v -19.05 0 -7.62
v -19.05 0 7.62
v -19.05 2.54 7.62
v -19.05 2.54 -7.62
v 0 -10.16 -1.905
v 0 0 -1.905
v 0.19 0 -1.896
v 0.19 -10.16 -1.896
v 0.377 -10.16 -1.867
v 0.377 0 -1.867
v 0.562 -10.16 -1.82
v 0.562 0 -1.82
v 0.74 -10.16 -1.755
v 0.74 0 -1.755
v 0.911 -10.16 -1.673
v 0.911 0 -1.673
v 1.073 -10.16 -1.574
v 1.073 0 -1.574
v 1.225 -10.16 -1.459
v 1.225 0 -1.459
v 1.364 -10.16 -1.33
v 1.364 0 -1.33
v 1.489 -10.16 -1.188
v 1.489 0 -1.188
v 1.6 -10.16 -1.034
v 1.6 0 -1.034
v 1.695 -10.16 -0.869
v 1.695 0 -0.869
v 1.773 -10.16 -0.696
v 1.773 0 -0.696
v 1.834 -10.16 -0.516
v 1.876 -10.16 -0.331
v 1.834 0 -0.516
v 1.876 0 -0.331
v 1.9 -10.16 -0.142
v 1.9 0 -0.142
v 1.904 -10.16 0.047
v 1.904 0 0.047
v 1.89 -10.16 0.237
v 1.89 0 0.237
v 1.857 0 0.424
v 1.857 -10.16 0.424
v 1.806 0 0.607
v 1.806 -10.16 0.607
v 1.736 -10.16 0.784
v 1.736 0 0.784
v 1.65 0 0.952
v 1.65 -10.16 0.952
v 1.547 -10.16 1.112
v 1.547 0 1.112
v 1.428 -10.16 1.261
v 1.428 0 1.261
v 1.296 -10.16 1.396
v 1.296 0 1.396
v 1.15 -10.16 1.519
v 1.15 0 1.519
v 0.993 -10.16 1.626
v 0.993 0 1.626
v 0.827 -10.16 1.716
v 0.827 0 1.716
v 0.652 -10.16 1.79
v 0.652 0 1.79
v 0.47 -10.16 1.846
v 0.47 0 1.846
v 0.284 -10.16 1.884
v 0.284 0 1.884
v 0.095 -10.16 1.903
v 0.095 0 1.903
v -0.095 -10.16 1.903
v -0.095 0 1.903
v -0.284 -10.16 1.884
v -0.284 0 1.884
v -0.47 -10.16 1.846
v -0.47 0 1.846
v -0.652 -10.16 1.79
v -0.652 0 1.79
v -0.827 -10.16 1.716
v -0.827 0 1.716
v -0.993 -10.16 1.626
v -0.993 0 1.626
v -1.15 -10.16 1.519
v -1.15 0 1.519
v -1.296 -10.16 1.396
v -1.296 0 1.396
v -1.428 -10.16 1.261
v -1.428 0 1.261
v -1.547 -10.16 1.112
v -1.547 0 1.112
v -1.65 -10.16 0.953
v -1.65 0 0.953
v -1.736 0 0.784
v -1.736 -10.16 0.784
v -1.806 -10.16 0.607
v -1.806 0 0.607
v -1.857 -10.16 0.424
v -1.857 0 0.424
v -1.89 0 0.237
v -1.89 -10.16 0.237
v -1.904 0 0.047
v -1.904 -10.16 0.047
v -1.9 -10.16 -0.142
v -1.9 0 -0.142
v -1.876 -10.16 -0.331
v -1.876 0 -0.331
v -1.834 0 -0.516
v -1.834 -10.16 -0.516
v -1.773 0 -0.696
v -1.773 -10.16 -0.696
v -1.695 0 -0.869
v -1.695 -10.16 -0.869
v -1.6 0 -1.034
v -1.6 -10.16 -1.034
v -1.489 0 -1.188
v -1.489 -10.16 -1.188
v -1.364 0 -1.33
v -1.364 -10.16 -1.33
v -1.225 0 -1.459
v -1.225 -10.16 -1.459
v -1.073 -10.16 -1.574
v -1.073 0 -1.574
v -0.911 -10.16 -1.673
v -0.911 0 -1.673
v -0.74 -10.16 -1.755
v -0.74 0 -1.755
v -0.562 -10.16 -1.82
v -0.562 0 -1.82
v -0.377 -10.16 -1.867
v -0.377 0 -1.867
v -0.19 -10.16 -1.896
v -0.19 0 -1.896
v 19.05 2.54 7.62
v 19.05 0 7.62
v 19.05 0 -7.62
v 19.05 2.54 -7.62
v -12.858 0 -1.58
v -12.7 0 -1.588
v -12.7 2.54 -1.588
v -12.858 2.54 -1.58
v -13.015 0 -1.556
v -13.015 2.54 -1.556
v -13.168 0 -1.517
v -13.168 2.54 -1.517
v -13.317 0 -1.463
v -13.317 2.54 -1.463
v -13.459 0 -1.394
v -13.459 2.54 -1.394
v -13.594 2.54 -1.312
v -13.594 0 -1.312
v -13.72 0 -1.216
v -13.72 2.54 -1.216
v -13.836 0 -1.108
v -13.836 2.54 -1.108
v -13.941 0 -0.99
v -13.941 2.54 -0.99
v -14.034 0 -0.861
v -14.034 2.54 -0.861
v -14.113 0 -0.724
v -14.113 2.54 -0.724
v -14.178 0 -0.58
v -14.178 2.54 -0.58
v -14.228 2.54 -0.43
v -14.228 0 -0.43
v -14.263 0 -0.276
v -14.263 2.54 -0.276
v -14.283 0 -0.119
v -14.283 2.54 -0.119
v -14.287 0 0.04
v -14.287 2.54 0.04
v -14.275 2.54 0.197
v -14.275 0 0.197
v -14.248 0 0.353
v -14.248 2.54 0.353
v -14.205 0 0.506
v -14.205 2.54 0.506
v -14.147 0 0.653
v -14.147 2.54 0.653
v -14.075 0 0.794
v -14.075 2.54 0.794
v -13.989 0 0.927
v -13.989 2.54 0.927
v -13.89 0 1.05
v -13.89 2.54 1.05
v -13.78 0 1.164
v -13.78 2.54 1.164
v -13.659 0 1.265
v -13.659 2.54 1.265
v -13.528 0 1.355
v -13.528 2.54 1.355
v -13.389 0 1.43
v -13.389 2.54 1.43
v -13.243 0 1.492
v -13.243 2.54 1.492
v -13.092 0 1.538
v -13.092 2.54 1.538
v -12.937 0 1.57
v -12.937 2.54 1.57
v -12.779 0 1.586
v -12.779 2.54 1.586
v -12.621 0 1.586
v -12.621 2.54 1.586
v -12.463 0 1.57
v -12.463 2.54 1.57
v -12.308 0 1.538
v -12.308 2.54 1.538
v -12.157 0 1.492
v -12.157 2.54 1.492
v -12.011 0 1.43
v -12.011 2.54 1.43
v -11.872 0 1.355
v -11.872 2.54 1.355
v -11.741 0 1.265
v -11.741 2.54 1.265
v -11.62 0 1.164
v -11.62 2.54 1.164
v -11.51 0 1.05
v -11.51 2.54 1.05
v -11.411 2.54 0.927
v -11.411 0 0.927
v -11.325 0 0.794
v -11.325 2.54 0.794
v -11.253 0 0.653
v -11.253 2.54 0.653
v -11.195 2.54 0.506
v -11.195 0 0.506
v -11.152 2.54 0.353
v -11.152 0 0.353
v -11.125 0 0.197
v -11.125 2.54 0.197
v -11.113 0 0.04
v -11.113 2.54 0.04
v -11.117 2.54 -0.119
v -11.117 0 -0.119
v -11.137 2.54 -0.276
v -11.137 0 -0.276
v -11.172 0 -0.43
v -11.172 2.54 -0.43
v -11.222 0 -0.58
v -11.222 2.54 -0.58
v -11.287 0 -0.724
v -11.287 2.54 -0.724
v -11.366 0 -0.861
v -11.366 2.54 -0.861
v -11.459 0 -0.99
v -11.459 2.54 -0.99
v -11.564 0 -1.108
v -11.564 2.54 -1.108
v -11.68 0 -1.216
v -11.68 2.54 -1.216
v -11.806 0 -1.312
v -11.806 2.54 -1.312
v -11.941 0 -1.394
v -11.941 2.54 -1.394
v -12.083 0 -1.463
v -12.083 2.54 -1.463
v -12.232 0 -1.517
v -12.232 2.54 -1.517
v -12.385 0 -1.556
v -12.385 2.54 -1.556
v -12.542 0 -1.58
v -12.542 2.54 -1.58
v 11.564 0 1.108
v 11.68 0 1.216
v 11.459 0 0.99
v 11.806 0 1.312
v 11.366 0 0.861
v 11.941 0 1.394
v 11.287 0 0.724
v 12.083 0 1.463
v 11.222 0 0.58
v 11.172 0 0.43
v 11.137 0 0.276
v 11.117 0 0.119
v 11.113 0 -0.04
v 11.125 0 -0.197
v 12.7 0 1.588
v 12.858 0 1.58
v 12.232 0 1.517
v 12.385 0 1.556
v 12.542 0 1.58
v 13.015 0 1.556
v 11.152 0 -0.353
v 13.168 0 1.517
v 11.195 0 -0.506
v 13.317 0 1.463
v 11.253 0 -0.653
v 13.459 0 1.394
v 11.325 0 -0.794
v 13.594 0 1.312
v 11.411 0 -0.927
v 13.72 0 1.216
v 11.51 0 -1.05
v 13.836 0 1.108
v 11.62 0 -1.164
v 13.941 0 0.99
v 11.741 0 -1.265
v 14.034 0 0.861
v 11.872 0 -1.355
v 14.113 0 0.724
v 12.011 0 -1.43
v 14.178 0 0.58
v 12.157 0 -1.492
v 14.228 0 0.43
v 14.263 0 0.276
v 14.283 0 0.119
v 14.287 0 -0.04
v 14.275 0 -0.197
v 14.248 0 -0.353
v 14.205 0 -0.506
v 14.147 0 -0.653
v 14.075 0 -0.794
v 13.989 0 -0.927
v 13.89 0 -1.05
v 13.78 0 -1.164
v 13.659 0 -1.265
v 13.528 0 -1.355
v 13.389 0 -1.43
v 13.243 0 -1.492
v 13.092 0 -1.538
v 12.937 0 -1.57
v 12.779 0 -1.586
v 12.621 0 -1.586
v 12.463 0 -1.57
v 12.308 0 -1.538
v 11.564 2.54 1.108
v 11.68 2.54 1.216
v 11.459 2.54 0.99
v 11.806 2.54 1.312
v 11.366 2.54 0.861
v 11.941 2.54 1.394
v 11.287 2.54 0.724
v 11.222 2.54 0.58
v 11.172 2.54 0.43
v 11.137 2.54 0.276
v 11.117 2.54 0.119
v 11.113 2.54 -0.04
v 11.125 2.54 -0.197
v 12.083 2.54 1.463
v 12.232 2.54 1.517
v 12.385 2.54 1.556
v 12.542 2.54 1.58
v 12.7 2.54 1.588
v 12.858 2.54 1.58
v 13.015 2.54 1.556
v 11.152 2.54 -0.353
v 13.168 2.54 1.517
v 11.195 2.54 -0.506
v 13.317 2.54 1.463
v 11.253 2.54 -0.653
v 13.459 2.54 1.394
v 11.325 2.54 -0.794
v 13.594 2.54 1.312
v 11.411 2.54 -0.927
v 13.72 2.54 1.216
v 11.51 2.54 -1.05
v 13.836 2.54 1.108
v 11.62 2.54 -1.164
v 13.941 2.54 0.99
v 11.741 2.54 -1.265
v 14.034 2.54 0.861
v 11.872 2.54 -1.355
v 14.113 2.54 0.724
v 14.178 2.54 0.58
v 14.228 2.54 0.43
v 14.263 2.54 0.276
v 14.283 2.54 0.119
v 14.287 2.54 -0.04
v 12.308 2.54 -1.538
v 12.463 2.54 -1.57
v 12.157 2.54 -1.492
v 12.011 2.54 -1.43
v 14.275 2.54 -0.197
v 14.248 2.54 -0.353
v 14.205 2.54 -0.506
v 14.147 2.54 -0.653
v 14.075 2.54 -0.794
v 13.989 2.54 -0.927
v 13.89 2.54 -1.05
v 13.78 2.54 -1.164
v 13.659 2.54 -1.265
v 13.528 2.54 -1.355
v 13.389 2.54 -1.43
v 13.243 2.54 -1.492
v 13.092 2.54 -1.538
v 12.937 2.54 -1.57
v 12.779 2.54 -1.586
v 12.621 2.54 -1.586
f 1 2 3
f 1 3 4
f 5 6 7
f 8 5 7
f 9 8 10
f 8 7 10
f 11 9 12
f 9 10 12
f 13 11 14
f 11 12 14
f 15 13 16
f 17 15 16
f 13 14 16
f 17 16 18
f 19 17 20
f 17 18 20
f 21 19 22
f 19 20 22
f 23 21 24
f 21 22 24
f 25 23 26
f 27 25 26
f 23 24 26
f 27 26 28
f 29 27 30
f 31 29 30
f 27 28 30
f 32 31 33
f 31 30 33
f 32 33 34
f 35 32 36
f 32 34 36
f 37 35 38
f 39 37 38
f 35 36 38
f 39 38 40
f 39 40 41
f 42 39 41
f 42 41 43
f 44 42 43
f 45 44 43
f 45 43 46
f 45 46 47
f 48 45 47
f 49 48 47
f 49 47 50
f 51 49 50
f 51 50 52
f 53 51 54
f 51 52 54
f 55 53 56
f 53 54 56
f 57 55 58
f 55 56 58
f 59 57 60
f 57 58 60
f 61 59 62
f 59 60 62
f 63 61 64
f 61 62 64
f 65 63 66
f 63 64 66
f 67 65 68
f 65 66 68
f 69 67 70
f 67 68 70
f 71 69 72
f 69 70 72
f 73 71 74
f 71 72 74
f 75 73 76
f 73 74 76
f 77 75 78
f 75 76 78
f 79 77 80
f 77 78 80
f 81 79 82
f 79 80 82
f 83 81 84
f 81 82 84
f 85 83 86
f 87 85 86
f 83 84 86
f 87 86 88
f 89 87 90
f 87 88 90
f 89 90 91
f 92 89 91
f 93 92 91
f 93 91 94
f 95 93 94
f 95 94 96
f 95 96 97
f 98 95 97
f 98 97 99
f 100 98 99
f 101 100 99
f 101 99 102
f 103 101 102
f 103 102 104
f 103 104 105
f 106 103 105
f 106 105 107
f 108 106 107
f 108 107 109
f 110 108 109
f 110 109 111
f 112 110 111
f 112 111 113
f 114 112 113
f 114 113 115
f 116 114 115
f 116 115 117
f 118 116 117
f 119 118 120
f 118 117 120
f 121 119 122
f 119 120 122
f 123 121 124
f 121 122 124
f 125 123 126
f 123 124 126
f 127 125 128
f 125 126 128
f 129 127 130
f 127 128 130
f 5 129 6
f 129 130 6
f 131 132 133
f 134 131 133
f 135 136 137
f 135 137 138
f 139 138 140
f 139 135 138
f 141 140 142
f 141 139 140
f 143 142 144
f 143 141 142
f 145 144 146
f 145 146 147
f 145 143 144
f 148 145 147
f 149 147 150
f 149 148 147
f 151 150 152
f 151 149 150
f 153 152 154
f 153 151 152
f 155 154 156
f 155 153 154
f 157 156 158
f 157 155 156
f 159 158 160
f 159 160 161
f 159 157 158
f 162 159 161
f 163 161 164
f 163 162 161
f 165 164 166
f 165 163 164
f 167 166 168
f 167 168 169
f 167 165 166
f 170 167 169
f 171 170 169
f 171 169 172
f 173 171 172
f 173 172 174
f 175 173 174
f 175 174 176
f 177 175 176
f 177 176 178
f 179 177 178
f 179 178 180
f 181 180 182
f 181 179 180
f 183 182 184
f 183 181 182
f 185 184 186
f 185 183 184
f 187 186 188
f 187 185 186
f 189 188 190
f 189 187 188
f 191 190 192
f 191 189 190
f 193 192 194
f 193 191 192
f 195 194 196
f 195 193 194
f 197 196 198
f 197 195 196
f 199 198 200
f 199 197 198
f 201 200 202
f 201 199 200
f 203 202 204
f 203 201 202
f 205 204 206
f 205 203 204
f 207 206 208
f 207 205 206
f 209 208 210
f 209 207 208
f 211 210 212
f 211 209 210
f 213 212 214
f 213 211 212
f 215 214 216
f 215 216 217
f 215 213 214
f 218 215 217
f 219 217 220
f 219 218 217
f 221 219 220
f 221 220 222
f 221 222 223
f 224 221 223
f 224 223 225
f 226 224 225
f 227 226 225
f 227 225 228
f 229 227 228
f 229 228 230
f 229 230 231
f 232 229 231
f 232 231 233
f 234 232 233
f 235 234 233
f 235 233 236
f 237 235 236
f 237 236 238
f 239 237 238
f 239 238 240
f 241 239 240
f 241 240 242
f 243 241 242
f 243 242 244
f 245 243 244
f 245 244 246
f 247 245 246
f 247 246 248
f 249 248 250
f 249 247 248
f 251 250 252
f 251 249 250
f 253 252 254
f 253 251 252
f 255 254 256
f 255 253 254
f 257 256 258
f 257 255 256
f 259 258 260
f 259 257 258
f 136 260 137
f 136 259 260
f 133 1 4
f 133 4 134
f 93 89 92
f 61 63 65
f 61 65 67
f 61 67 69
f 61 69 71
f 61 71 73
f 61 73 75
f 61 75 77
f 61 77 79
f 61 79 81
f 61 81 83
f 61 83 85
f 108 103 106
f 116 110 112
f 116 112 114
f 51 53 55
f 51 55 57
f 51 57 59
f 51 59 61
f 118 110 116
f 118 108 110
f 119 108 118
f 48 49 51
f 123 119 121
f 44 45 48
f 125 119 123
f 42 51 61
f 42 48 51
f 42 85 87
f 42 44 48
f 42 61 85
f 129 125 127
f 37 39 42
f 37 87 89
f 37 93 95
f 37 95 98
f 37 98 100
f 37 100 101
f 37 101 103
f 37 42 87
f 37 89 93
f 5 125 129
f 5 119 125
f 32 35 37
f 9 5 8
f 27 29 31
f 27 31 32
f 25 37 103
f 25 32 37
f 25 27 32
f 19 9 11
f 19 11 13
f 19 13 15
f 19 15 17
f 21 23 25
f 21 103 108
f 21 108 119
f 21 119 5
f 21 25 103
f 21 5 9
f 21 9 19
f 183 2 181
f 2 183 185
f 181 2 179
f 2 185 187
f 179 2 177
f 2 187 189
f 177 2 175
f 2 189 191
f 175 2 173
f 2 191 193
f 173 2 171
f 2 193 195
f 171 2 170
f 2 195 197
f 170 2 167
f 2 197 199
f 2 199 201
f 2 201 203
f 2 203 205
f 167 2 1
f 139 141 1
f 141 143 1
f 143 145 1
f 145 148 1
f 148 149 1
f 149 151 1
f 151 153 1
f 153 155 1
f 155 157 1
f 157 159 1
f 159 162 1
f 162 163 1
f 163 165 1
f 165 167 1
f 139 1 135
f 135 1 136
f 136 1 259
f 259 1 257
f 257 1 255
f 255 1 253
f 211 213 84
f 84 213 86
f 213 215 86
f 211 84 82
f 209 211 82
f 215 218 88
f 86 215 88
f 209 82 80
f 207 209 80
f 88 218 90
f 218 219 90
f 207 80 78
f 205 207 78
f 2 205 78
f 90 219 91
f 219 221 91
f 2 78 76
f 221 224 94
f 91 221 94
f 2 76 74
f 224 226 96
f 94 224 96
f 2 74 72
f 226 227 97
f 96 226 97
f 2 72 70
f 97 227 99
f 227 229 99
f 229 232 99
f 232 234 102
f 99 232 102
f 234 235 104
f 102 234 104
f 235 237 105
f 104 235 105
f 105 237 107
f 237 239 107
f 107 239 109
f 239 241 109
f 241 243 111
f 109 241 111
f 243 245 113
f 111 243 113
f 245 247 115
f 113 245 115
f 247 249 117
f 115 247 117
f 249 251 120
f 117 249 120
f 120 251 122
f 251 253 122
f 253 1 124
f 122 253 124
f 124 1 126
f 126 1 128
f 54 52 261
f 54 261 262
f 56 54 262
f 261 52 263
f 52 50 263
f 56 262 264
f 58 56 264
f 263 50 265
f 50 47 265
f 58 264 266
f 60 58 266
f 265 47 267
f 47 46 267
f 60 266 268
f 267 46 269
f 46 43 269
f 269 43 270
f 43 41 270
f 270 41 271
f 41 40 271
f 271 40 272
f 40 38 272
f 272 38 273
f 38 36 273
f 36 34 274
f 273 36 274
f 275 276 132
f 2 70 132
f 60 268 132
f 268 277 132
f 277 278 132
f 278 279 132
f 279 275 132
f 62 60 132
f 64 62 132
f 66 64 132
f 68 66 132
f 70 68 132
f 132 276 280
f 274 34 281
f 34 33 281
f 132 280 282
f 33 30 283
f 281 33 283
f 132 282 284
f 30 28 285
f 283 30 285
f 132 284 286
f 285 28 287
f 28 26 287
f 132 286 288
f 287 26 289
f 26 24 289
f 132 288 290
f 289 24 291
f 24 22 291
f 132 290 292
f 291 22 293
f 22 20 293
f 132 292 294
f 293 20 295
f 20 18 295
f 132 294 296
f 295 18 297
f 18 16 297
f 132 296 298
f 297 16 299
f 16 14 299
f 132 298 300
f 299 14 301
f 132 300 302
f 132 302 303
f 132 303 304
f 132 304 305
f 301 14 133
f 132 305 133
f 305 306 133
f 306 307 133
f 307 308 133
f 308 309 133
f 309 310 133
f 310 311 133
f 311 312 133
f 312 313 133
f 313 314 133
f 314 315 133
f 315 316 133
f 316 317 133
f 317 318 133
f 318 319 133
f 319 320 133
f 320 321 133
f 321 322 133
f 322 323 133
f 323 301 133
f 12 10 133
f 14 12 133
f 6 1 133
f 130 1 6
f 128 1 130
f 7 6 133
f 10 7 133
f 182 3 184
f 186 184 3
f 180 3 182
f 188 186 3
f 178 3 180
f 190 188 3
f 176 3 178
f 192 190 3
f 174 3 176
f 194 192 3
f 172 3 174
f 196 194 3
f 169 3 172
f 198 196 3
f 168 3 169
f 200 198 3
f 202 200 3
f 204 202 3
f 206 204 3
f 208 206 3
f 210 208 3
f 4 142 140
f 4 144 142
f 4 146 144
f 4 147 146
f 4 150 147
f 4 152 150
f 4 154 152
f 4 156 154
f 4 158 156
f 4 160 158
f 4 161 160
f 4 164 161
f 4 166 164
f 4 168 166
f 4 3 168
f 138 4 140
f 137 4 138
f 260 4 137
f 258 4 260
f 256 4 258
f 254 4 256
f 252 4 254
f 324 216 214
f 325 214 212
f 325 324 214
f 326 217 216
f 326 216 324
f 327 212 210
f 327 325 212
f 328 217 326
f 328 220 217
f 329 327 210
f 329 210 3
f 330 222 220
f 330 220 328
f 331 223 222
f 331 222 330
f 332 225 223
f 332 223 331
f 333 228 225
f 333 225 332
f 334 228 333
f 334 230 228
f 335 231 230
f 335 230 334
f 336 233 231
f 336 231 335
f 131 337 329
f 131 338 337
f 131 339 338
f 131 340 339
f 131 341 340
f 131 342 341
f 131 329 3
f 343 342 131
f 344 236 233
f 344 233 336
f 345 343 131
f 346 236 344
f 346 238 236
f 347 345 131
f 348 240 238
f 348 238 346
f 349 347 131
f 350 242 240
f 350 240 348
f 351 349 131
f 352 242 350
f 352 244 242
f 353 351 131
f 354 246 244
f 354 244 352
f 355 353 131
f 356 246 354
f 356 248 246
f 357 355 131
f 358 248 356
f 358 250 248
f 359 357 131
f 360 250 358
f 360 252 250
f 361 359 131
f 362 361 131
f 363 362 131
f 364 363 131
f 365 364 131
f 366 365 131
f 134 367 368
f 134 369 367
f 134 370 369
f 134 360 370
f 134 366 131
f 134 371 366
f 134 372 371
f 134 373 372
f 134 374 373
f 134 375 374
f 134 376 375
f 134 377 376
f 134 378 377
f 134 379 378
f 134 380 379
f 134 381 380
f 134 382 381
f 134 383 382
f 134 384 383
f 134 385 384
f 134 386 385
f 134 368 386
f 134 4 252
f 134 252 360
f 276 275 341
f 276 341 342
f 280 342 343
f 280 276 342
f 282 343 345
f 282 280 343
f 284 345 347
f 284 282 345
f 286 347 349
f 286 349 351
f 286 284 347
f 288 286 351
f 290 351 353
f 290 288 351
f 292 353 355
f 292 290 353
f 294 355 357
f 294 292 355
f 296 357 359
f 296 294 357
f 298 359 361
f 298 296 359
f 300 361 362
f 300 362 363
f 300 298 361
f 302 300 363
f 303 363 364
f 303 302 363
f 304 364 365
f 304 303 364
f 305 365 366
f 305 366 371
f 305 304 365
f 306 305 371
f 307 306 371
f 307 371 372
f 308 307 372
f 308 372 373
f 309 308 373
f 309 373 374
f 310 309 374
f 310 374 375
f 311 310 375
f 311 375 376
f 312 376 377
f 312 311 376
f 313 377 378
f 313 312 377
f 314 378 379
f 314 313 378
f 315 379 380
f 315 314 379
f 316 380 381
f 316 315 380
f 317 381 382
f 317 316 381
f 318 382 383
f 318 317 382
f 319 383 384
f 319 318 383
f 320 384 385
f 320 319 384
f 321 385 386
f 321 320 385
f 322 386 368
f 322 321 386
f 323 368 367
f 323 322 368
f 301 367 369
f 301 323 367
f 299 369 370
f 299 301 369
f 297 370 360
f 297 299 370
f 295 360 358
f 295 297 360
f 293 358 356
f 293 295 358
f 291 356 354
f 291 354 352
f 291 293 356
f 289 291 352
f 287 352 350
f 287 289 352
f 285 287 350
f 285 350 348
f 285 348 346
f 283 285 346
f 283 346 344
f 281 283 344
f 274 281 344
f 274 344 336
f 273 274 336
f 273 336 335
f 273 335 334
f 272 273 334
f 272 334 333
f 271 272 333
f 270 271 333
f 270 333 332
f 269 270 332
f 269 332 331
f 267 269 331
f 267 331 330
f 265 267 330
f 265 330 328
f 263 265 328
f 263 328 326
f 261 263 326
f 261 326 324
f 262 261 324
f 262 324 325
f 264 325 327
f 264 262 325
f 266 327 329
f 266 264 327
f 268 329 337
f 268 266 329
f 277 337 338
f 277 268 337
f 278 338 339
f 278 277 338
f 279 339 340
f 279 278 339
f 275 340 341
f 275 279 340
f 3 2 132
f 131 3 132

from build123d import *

# Parameters (mm, degrees)
SKETCH2_W           = 38.1
SKETCH2_H           = 15.24
SKETCH2_R           = 1.5875
BOSS_EXTRUDE1_DEPTH = 2.54
SKETCH3_R           = 1.905
BOSS_EXTRUDE2_DEPTH = 10.16


with BuildPart() as part:
    # Sketch2 → Boss-Extrude1 (new body)
    with BuildSketch(Plane(origin=(0, 0, 0), x_dir=(1, 0, 0), z_dir=(0, 1, 0))):
        Rectangle(SKETCH2_W, SKETCH2_H)
        with Locations(Location((12.7, 0, 0), (0, 0, 270))):
            Circle(SKETCH2_R, mode=Mode.SUBTRACT)
        with Locations(Location((-12.7, 0, 0), (0, 0, 90))):
            Circle(SKETCH2_R, mode=Mode.SUBTRACT)
    extrude(amount=BOSS_EXTRUDE1_DEPTH)

    # Sketch3 → Boss-Extrude2 (add)
    with BuildSketch(Plane.XZ):
        with Locations(Location((0, 0, 0), (0, 0, 270))):
            Circle(SKETCH3_R)
    extrude(amount=BOSS_EXTRUDE2_DEPTH)


solid = part.part
